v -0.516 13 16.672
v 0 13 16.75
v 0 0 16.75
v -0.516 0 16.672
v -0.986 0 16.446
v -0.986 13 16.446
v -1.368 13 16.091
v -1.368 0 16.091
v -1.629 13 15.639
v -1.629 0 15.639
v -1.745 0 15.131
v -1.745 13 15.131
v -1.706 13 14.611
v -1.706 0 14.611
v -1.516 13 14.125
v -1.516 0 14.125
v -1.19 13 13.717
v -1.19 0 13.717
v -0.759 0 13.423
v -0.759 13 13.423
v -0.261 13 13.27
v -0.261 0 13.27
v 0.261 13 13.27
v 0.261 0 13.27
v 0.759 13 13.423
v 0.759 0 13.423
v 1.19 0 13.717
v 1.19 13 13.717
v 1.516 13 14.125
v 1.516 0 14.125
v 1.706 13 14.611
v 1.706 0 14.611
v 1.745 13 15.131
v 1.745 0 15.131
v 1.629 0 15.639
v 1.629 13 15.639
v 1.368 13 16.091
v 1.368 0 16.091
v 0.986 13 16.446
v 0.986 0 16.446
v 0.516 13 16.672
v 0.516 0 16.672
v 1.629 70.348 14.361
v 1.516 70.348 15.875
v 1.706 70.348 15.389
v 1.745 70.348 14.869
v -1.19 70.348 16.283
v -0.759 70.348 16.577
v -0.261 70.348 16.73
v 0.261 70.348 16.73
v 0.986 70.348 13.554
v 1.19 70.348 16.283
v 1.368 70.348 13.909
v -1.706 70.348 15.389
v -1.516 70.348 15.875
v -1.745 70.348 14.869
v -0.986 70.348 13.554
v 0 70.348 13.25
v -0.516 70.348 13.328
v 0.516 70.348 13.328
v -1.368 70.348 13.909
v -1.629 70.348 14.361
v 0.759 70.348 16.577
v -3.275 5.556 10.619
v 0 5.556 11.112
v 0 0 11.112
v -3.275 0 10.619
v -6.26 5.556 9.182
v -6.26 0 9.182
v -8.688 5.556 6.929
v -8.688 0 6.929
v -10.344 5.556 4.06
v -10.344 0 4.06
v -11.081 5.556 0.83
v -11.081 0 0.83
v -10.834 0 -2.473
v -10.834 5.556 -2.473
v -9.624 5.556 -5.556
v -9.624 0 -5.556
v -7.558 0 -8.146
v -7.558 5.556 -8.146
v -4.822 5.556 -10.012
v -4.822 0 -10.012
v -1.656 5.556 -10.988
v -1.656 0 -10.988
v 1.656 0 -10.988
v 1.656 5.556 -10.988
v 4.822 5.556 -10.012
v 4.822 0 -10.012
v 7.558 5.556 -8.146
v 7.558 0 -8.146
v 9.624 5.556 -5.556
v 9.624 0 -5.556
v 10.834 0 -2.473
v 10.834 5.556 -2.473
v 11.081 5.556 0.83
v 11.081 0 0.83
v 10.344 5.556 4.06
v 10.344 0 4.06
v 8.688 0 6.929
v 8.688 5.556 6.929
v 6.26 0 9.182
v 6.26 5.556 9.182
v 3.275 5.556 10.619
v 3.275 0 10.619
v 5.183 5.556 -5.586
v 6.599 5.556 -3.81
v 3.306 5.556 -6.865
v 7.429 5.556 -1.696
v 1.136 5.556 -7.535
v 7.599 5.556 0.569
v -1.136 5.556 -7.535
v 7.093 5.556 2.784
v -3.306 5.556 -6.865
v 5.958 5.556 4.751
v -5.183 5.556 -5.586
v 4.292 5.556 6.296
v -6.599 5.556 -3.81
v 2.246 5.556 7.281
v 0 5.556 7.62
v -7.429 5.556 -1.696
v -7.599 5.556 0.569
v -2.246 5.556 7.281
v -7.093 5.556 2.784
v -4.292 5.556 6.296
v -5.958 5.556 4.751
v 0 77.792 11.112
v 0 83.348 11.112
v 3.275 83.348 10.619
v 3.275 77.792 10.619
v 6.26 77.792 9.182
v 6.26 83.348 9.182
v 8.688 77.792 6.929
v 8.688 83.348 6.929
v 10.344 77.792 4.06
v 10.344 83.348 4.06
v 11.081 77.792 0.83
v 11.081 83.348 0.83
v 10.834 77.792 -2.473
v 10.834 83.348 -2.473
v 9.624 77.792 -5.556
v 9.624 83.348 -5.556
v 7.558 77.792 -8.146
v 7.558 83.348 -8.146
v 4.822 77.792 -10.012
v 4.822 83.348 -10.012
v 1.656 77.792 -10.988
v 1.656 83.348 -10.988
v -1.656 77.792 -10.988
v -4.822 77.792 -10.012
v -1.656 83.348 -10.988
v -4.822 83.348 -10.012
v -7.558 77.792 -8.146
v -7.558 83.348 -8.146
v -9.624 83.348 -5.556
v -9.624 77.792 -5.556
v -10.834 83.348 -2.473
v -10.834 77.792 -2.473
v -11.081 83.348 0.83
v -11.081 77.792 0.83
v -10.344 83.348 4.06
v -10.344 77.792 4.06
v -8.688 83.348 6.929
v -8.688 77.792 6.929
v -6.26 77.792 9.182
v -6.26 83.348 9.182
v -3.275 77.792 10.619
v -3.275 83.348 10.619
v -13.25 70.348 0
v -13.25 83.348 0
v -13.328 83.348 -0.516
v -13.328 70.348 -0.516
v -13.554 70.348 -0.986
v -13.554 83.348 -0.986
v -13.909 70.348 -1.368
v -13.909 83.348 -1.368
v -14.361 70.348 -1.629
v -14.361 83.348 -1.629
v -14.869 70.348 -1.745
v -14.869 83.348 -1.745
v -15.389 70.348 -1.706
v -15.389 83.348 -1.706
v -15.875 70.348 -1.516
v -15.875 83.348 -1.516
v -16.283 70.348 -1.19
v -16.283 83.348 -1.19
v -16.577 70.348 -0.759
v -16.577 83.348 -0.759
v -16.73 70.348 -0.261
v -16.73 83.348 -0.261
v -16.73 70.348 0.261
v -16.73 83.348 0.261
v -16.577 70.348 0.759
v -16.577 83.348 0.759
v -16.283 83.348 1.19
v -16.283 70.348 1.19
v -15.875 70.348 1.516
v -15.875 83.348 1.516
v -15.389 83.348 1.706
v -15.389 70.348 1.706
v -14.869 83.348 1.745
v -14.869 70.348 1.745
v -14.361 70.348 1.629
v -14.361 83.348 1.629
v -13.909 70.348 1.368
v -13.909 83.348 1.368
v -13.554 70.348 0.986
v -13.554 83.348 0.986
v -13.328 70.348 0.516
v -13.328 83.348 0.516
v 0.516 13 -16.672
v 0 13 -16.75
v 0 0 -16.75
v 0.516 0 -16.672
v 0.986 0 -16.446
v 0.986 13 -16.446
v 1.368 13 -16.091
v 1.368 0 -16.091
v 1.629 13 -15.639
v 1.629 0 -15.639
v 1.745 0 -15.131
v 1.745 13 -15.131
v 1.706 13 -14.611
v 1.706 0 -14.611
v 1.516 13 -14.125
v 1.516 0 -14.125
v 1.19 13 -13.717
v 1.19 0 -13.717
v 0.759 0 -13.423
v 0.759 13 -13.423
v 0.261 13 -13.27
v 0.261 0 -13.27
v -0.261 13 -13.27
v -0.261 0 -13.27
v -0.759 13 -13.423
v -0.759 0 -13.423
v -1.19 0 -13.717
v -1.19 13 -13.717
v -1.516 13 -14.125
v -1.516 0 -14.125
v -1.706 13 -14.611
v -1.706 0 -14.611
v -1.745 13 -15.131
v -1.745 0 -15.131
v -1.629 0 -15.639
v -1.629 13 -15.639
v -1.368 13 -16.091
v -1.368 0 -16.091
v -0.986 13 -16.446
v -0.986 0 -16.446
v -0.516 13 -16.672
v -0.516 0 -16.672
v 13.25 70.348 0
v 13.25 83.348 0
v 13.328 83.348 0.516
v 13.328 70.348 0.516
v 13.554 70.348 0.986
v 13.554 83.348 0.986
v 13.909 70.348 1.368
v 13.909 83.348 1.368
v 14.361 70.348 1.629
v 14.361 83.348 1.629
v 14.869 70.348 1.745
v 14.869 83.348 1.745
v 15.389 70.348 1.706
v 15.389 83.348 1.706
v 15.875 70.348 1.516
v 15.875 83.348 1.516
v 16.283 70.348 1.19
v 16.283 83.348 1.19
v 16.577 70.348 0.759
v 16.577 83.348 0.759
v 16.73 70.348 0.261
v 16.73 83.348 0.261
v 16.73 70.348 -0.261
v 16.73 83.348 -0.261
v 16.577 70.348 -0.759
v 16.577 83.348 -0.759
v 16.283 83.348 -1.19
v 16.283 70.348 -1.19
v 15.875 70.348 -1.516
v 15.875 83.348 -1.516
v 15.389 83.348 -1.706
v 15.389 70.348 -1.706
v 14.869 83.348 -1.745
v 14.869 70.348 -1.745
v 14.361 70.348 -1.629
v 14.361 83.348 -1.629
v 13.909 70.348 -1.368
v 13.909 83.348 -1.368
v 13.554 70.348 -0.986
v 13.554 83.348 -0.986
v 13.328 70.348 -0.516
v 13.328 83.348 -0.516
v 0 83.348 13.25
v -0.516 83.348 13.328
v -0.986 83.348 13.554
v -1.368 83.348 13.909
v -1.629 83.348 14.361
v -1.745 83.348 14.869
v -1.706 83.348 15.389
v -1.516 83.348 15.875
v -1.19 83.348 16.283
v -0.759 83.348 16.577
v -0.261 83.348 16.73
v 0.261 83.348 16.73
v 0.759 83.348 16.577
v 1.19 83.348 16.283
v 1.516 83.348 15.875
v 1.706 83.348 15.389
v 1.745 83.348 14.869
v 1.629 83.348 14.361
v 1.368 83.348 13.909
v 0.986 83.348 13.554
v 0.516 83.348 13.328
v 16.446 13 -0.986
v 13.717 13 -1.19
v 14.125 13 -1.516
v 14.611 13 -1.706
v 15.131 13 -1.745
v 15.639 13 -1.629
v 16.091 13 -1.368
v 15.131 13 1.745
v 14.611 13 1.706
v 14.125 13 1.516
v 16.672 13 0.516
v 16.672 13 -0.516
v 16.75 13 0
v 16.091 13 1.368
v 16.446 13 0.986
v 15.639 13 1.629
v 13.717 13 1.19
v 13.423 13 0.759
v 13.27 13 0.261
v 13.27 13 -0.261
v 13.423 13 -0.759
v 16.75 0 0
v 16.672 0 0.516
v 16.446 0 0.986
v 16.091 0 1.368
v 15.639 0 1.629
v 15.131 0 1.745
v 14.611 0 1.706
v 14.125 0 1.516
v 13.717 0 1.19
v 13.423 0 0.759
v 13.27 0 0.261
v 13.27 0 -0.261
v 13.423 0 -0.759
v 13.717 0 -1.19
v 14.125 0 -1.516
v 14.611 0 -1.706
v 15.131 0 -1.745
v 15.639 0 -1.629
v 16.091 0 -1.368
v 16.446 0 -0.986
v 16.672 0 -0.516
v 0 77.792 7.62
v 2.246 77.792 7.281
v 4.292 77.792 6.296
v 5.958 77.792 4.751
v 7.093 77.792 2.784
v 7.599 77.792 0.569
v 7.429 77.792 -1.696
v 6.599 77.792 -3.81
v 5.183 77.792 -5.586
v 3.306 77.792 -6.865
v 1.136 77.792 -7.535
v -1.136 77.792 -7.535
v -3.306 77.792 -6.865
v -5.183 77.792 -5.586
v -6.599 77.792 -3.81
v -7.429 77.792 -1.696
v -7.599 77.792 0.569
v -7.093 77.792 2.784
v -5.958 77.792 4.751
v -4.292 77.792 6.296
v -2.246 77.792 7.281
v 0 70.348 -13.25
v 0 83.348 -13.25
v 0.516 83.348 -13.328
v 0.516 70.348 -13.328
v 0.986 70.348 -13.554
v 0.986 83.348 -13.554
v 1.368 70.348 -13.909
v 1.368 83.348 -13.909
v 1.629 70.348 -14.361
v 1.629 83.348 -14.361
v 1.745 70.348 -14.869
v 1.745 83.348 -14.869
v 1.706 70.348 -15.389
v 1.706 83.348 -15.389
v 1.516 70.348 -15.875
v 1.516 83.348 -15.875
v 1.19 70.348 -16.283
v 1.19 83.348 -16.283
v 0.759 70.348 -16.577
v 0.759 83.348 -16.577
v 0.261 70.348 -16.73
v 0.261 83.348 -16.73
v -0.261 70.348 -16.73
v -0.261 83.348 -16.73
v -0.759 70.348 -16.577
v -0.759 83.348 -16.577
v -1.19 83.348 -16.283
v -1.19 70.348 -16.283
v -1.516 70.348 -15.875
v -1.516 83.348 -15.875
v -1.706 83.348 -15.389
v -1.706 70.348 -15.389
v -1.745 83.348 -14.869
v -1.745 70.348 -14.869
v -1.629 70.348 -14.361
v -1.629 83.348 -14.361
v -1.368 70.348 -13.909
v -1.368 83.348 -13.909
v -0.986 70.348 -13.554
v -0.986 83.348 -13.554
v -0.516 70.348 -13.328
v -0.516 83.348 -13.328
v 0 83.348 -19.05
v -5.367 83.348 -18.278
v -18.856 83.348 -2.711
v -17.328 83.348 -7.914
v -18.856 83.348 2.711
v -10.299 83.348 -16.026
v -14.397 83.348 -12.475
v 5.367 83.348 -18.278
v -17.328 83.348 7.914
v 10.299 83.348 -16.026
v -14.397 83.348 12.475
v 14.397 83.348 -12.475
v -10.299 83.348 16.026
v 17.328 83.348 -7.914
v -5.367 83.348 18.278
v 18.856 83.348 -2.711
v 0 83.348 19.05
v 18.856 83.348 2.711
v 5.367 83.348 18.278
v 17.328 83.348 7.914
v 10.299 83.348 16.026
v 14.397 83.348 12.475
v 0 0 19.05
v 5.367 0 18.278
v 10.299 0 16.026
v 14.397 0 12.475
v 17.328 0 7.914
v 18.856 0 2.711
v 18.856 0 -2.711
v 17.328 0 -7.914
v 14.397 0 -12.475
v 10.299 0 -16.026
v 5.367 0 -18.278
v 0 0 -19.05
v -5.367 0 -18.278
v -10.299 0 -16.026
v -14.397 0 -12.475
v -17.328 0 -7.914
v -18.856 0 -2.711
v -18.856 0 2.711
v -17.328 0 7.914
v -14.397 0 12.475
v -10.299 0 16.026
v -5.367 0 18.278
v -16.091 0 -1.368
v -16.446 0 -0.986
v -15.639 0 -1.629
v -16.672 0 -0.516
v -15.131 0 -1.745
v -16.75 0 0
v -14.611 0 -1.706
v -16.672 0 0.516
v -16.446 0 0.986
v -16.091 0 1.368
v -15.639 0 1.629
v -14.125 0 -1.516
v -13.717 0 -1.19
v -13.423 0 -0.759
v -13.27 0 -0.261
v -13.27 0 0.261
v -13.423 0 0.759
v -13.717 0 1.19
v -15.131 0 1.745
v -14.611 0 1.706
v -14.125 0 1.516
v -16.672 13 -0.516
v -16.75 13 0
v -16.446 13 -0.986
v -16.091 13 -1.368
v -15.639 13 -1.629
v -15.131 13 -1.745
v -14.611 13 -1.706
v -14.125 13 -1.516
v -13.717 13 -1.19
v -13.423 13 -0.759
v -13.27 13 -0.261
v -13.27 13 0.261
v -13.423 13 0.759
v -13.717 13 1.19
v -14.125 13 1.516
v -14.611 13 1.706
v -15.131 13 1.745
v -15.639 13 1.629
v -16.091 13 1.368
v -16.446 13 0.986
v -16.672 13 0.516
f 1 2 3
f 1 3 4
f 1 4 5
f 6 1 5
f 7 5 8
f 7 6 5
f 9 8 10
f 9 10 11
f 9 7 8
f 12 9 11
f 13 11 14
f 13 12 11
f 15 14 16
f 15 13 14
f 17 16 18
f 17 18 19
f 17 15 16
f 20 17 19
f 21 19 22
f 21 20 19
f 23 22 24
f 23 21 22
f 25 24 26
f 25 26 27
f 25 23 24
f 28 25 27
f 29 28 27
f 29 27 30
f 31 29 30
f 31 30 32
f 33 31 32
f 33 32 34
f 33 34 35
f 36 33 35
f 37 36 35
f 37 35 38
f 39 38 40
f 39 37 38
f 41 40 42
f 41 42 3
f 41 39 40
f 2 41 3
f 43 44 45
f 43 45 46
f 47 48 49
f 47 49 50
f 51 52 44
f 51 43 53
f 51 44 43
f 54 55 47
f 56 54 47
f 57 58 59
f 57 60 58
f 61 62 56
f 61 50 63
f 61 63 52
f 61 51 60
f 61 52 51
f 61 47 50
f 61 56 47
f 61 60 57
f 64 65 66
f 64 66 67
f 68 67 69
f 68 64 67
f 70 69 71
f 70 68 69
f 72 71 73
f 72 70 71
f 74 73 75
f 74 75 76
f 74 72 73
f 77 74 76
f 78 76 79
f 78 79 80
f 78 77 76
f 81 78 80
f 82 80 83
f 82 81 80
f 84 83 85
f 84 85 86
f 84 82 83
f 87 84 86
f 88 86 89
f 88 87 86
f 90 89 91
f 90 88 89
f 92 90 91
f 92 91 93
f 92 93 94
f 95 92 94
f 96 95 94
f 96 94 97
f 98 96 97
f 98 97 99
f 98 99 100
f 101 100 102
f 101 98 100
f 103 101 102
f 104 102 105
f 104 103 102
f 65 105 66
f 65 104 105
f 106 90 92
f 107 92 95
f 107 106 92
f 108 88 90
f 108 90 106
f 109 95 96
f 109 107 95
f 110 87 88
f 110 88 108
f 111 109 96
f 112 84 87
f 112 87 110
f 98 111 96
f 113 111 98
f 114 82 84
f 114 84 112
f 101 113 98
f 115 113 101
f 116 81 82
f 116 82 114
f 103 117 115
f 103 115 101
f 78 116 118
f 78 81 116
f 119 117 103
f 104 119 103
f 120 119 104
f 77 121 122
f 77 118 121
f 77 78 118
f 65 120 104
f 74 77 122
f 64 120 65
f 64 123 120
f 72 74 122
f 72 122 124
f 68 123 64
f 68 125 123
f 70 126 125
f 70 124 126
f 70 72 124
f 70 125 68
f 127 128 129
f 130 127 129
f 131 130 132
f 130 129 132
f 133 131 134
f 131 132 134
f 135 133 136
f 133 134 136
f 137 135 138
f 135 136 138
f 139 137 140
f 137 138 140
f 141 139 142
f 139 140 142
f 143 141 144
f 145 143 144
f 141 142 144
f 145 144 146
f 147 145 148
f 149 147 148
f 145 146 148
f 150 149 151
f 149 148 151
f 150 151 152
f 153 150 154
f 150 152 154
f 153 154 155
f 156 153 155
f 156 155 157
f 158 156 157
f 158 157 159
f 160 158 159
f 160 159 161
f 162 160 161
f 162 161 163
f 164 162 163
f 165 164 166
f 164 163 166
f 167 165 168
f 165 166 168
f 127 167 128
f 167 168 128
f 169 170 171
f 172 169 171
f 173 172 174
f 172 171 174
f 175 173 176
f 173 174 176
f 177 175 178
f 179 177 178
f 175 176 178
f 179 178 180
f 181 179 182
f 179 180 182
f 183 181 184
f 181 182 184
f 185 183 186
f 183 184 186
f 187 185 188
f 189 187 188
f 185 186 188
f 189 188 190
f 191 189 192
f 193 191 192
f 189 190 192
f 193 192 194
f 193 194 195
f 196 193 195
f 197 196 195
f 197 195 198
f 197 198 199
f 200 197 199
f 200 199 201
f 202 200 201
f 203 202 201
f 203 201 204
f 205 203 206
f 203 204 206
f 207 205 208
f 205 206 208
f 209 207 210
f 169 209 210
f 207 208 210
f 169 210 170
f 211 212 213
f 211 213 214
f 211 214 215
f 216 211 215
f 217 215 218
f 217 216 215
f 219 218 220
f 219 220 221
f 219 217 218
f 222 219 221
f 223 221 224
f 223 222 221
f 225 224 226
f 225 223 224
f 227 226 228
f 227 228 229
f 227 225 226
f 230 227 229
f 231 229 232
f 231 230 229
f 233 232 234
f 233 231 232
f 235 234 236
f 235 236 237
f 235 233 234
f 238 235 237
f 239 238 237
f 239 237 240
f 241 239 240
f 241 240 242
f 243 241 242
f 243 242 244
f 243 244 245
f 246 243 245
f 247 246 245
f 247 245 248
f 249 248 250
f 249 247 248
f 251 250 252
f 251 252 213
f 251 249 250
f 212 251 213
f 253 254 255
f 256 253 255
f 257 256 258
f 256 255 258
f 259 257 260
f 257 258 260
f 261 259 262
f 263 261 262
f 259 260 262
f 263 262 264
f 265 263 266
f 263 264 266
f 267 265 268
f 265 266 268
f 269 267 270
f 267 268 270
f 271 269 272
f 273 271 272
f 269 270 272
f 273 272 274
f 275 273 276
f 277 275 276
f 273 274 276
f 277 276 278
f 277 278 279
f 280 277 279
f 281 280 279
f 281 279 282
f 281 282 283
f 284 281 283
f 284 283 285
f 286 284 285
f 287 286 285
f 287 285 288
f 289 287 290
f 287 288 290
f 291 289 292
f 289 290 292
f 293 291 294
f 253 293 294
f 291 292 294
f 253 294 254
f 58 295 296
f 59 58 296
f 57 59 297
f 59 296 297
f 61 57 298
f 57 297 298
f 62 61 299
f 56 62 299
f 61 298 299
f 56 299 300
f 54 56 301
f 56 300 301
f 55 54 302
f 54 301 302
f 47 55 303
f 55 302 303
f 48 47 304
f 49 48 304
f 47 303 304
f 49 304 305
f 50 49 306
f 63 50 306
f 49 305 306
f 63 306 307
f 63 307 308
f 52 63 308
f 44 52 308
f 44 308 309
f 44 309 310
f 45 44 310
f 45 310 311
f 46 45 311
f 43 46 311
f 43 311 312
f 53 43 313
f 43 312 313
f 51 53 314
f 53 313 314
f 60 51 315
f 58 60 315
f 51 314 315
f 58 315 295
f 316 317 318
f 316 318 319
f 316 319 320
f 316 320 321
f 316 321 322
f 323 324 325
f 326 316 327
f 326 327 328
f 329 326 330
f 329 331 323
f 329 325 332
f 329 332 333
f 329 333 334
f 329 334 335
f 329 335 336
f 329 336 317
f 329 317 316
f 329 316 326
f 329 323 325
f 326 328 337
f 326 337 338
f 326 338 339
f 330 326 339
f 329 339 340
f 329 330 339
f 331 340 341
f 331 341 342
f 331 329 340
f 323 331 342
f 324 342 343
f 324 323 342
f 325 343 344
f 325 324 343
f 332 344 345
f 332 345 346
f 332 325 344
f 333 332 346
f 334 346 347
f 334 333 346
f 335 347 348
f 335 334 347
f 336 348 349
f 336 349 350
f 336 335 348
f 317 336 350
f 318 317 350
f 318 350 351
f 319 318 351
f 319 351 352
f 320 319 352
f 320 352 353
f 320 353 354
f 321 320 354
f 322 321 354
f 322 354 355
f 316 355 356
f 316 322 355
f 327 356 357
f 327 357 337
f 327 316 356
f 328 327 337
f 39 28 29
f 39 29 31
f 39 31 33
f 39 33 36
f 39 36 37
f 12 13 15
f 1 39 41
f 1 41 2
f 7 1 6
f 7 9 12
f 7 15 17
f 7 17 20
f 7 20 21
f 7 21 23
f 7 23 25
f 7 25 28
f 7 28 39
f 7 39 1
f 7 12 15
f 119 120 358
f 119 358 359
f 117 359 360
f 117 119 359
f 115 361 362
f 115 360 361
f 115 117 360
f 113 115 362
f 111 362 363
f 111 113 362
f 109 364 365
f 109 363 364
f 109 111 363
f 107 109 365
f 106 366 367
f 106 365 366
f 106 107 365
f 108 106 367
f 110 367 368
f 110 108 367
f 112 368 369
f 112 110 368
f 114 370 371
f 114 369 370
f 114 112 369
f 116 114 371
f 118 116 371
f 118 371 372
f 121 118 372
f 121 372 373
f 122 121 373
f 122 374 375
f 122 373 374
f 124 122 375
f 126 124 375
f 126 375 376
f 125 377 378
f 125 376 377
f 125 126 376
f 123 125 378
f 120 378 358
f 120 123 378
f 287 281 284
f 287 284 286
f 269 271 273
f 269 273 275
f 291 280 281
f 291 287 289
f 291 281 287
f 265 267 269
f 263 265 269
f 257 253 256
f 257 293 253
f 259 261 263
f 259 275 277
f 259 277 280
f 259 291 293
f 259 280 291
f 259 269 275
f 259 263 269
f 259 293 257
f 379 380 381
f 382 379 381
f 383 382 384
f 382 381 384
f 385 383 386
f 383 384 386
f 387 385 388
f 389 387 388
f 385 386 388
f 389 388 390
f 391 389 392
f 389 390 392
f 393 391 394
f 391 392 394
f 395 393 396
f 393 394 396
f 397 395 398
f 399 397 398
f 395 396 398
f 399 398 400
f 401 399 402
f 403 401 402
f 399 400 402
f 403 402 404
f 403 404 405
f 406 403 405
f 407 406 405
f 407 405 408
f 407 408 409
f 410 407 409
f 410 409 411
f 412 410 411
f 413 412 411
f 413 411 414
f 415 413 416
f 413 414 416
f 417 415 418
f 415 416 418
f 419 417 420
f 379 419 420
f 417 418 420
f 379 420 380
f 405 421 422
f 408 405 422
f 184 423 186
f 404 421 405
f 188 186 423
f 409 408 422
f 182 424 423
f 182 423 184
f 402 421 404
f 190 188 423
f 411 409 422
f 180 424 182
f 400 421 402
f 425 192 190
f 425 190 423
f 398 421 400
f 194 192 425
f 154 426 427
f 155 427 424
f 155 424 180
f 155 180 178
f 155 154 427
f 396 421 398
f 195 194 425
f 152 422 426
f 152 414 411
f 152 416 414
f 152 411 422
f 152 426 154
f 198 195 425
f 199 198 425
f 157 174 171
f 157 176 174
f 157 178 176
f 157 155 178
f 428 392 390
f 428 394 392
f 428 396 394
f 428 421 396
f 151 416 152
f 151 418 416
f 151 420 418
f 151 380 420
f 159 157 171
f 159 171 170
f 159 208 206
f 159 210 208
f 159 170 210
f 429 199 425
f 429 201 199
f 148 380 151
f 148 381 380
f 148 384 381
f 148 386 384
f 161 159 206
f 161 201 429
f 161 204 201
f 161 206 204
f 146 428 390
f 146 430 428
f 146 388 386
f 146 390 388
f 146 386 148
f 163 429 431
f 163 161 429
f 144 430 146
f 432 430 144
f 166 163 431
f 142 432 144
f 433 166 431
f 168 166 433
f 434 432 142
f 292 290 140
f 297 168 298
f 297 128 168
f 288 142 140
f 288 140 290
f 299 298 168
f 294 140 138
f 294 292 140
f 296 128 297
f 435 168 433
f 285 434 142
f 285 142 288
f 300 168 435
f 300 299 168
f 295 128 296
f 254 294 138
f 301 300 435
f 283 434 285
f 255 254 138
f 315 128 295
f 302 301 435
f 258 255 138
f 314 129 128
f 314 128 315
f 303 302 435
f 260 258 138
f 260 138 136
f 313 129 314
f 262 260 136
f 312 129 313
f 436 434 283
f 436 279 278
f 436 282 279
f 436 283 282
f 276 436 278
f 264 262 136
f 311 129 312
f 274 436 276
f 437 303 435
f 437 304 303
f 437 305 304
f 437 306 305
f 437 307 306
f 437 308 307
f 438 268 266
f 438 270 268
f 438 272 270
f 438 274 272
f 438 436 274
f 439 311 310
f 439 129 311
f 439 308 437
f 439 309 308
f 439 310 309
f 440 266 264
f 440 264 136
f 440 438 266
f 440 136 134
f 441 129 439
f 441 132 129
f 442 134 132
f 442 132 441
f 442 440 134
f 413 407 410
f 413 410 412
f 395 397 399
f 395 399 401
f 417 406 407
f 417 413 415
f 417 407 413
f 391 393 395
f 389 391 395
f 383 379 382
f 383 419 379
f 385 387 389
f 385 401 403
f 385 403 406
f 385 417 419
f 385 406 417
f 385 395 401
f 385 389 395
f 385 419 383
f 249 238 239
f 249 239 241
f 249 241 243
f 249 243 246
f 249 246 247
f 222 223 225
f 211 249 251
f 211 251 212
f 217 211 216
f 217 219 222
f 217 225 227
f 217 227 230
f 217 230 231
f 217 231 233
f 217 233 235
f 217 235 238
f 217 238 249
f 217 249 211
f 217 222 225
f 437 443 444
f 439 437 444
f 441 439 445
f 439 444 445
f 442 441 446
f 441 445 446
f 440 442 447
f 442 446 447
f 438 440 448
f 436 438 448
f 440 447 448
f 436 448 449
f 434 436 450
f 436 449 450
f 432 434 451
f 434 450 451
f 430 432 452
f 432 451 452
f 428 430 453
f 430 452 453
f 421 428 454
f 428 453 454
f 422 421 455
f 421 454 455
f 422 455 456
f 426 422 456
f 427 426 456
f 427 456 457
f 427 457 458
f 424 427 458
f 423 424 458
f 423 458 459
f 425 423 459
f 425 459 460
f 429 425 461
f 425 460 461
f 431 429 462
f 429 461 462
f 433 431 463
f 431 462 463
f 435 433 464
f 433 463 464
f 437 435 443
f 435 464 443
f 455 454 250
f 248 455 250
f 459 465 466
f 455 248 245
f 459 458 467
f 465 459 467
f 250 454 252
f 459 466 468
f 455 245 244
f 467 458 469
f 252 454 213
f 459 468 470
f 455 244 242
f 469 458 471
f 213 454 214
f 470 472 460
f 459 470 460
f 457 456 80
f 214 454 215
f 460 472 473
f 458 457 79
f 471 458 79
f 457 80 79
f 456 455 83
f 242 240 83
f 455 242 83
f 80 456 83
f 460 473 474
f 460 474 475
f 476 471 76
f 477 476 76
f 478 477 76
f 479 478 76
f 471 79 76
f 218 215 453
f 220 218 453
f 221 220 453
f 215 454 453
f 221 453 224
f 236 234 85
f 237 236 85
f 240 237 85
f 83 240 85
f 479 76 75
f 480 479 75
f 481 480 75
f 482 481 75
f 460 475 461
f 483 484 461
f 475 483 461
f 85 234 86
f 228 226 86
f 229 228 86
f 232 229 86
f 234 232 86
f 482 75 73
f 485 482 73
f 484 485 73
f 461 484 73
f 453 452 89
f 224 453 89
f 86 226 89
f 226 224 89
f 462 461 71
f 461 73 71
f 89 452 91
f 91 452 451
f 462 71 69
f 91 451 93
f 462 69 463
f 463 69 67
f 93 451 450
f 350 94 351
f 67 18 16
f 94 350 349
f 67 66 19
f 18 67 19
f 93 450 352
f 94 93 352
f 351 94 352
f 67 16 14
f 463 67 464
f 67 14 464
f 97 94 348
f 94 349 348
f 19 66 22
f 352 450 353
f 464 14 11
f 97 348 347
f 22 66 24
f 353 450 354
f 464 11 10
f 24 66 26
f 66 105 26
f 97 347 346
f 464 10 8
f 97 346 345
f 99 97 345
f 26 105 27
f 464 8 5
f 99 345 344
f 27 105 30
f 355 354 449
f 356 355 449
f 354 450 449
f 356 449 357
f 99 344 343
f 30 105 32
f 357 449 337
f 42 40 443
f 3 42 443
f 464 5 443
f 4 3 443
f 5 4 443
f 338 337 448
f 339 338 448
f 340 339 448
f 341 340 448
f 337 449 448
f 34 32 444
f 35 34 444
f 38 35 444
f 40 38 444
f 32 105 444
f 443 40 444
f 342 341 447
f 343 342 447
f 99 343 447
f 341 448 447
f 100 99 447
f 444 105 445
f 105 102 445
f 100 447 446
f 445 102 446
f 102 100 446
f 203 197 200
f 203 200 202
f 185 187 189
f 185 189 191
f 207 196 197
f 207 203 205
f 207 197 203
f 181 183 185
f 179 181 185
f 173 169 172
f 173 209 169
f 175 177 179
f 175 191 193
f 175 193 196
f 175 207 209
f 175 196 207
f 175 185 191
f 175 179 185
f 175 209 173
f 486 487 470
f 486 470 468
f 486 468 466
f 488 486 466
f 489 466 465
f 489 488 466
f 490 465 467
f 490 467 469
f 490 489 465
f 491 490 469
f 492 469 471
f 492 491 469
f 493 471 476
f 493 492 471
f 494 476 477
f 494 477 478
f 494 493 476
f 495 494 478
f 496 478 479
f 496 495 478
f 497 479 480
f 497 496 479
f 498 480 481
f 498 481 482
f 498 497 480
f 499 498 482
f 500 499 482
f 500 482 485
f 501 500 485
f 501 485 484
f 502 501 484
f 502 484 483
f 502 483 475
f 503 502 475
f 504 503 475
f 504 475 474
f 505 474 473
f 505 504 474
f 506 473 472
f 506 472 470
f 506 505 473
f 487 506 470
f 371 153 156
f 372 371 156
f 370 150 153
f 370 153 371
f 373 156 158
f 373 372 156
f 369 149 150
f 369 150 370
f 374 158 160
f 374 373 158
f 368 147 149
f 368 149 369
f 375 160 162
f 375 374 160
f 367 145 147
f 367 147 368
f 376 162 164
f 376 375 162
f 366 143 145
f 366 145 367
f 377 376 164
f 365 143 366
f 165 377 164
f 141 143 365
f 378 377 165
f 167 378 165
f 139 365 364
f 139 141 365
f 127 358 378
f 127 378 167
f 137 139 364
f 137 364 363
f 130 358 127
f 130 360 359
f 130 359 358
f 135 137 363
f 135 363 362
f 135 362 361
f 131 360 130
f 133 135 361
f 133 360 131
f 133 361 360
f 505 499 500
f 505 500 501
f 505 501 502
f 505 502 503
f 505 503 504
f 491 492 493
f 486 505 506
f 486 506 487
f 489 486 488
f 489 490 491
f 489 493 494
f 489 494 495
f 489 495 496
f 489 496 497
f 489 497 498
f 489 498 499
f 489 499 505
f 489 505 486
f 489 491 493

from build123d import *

# Parameters (mm, degrees)
SKETCH1_R           = 19.05
SKETCH1_R_2         = 7.62
BOSS_EXTRUDE1_DEPTH = 83.348208
SKETCH3_R           = 11.1125
CUT_EXTRUDE2_DEPTH  = 5.5562754
CUT_EXTRUDE3_START  = -5.5562754
SKETCH4_R           = 11.1125
CUT_EXTRUDE3_DEPTH  = 5.5562754
SKETCH13_R          = 1.75
CUT_EXTRUDE4_DEPTH  = 13
CIRPATTERN2_COUNT   = 4
CUT_EXTRUDE6_START  = -13
SKETCH19_R          = 1.75
CUT_EXTRUDE6_DEPTH  = 13
CIRPATTERN4_COUNT   = 4


with BuildPart() as part:
    # Sketch1 → Boss-Extrude1 (new body)
    with BuildSketch(Plane(origin=(0, 0, 0), x_dir=(1, 0, 0), z_dir=(0, 1, 0))):
        with Locations(Location((0, 0, 0), (0, 0, 270))):
            Circle(SKETCH1_R)
        with Locations(Location((0, 0, 0), (0, 0, 270))):
            Circle(SKETCH1_R_2, mode=Mode.SUBTRACT)
    extrude(amount=BOSS_EXTRUDE1_DEPTH)

    # Sketch3 → Cut-Extrude2 (cut)
    with BuildSketch(Plane(origin=(0, 83.348208, 0), x_dir=(1, 0, 0), z_dir=(0, 1, 0))):
        with Locations(Location((0, 0, 0), (0, 0, 270))):
            Circle(SKETCH3_R)
    extrude(amount=-CUT_EXTRUDE2_DEPTH, mode=Mode.SUBTRACT)

    # Sketch4 → Cut-Extrude3 (cut)
    with BuildSketch(Plane.XZ.offset(CUT_EXTRUDE3_START)):
        with Locations(Location((0, 0, 0), (0, 0, 90))):
            Circle(SKETCH4_R)
    extrude(amount=CUT_EXTRUDE3_DEPTH, mode=Mode.SUBTRACT)

    # Sketch13 → Cut-Extrude4 (cut)
    with BuildSketch(Plane(origin=(0, 83.348208, 0), x_dir=(1, 0, 0), z_dir=(0, 1, 0))):
        with Locations(Location((0, 15, 0), (0, 0, 270))):
            Circle(SKETCH13_R)
    cut_extrude4 = extrude(amount=-CUT_EXTRUDE4_DEPTH, mode=Mode.SUBTRACT)

    # CirPattern2: Cut-Extrude4 ×4 about axis
    cirpattern2_axis = Axis((0, 0, 0), (0, 1, 0))
    for i in range(1, CIRPATTERN2_COUNT):
        add(cut_extrude4.rotate(cirpattern2_axis, i * 360 / CIRPATTERN2_COUNT), mode=Mode.SUBTRACT)

    # Sketch19 → Cut-Extrude6 (cut)
    with BuildSketch(Plane.XZ.offset(CUT_EXTRUDE6_START)):
        with Locations(Location((0, 15, 0), (0, 0, 90))):
            Circle(SKETCH19_R)
    cut_extrude6 = extrude(amount=CUT_EXTRUDE6_DEPTH, mode=Mode.SUBTRACT)

    # CirPattern4: Cut-Extrude6 ×4 about axis
    cirpattern4_axis = Axis((0, 0, 0), (0, 1, 0))
    for i in range(1, CIRPATTERN4_COUNT):
        add(cut_extrude6.rotate(cirpattern4_axis, i * 360 / CIRPATTERN4_COUNT), mode=Mode.SUBTRACT)


solid = part.part
